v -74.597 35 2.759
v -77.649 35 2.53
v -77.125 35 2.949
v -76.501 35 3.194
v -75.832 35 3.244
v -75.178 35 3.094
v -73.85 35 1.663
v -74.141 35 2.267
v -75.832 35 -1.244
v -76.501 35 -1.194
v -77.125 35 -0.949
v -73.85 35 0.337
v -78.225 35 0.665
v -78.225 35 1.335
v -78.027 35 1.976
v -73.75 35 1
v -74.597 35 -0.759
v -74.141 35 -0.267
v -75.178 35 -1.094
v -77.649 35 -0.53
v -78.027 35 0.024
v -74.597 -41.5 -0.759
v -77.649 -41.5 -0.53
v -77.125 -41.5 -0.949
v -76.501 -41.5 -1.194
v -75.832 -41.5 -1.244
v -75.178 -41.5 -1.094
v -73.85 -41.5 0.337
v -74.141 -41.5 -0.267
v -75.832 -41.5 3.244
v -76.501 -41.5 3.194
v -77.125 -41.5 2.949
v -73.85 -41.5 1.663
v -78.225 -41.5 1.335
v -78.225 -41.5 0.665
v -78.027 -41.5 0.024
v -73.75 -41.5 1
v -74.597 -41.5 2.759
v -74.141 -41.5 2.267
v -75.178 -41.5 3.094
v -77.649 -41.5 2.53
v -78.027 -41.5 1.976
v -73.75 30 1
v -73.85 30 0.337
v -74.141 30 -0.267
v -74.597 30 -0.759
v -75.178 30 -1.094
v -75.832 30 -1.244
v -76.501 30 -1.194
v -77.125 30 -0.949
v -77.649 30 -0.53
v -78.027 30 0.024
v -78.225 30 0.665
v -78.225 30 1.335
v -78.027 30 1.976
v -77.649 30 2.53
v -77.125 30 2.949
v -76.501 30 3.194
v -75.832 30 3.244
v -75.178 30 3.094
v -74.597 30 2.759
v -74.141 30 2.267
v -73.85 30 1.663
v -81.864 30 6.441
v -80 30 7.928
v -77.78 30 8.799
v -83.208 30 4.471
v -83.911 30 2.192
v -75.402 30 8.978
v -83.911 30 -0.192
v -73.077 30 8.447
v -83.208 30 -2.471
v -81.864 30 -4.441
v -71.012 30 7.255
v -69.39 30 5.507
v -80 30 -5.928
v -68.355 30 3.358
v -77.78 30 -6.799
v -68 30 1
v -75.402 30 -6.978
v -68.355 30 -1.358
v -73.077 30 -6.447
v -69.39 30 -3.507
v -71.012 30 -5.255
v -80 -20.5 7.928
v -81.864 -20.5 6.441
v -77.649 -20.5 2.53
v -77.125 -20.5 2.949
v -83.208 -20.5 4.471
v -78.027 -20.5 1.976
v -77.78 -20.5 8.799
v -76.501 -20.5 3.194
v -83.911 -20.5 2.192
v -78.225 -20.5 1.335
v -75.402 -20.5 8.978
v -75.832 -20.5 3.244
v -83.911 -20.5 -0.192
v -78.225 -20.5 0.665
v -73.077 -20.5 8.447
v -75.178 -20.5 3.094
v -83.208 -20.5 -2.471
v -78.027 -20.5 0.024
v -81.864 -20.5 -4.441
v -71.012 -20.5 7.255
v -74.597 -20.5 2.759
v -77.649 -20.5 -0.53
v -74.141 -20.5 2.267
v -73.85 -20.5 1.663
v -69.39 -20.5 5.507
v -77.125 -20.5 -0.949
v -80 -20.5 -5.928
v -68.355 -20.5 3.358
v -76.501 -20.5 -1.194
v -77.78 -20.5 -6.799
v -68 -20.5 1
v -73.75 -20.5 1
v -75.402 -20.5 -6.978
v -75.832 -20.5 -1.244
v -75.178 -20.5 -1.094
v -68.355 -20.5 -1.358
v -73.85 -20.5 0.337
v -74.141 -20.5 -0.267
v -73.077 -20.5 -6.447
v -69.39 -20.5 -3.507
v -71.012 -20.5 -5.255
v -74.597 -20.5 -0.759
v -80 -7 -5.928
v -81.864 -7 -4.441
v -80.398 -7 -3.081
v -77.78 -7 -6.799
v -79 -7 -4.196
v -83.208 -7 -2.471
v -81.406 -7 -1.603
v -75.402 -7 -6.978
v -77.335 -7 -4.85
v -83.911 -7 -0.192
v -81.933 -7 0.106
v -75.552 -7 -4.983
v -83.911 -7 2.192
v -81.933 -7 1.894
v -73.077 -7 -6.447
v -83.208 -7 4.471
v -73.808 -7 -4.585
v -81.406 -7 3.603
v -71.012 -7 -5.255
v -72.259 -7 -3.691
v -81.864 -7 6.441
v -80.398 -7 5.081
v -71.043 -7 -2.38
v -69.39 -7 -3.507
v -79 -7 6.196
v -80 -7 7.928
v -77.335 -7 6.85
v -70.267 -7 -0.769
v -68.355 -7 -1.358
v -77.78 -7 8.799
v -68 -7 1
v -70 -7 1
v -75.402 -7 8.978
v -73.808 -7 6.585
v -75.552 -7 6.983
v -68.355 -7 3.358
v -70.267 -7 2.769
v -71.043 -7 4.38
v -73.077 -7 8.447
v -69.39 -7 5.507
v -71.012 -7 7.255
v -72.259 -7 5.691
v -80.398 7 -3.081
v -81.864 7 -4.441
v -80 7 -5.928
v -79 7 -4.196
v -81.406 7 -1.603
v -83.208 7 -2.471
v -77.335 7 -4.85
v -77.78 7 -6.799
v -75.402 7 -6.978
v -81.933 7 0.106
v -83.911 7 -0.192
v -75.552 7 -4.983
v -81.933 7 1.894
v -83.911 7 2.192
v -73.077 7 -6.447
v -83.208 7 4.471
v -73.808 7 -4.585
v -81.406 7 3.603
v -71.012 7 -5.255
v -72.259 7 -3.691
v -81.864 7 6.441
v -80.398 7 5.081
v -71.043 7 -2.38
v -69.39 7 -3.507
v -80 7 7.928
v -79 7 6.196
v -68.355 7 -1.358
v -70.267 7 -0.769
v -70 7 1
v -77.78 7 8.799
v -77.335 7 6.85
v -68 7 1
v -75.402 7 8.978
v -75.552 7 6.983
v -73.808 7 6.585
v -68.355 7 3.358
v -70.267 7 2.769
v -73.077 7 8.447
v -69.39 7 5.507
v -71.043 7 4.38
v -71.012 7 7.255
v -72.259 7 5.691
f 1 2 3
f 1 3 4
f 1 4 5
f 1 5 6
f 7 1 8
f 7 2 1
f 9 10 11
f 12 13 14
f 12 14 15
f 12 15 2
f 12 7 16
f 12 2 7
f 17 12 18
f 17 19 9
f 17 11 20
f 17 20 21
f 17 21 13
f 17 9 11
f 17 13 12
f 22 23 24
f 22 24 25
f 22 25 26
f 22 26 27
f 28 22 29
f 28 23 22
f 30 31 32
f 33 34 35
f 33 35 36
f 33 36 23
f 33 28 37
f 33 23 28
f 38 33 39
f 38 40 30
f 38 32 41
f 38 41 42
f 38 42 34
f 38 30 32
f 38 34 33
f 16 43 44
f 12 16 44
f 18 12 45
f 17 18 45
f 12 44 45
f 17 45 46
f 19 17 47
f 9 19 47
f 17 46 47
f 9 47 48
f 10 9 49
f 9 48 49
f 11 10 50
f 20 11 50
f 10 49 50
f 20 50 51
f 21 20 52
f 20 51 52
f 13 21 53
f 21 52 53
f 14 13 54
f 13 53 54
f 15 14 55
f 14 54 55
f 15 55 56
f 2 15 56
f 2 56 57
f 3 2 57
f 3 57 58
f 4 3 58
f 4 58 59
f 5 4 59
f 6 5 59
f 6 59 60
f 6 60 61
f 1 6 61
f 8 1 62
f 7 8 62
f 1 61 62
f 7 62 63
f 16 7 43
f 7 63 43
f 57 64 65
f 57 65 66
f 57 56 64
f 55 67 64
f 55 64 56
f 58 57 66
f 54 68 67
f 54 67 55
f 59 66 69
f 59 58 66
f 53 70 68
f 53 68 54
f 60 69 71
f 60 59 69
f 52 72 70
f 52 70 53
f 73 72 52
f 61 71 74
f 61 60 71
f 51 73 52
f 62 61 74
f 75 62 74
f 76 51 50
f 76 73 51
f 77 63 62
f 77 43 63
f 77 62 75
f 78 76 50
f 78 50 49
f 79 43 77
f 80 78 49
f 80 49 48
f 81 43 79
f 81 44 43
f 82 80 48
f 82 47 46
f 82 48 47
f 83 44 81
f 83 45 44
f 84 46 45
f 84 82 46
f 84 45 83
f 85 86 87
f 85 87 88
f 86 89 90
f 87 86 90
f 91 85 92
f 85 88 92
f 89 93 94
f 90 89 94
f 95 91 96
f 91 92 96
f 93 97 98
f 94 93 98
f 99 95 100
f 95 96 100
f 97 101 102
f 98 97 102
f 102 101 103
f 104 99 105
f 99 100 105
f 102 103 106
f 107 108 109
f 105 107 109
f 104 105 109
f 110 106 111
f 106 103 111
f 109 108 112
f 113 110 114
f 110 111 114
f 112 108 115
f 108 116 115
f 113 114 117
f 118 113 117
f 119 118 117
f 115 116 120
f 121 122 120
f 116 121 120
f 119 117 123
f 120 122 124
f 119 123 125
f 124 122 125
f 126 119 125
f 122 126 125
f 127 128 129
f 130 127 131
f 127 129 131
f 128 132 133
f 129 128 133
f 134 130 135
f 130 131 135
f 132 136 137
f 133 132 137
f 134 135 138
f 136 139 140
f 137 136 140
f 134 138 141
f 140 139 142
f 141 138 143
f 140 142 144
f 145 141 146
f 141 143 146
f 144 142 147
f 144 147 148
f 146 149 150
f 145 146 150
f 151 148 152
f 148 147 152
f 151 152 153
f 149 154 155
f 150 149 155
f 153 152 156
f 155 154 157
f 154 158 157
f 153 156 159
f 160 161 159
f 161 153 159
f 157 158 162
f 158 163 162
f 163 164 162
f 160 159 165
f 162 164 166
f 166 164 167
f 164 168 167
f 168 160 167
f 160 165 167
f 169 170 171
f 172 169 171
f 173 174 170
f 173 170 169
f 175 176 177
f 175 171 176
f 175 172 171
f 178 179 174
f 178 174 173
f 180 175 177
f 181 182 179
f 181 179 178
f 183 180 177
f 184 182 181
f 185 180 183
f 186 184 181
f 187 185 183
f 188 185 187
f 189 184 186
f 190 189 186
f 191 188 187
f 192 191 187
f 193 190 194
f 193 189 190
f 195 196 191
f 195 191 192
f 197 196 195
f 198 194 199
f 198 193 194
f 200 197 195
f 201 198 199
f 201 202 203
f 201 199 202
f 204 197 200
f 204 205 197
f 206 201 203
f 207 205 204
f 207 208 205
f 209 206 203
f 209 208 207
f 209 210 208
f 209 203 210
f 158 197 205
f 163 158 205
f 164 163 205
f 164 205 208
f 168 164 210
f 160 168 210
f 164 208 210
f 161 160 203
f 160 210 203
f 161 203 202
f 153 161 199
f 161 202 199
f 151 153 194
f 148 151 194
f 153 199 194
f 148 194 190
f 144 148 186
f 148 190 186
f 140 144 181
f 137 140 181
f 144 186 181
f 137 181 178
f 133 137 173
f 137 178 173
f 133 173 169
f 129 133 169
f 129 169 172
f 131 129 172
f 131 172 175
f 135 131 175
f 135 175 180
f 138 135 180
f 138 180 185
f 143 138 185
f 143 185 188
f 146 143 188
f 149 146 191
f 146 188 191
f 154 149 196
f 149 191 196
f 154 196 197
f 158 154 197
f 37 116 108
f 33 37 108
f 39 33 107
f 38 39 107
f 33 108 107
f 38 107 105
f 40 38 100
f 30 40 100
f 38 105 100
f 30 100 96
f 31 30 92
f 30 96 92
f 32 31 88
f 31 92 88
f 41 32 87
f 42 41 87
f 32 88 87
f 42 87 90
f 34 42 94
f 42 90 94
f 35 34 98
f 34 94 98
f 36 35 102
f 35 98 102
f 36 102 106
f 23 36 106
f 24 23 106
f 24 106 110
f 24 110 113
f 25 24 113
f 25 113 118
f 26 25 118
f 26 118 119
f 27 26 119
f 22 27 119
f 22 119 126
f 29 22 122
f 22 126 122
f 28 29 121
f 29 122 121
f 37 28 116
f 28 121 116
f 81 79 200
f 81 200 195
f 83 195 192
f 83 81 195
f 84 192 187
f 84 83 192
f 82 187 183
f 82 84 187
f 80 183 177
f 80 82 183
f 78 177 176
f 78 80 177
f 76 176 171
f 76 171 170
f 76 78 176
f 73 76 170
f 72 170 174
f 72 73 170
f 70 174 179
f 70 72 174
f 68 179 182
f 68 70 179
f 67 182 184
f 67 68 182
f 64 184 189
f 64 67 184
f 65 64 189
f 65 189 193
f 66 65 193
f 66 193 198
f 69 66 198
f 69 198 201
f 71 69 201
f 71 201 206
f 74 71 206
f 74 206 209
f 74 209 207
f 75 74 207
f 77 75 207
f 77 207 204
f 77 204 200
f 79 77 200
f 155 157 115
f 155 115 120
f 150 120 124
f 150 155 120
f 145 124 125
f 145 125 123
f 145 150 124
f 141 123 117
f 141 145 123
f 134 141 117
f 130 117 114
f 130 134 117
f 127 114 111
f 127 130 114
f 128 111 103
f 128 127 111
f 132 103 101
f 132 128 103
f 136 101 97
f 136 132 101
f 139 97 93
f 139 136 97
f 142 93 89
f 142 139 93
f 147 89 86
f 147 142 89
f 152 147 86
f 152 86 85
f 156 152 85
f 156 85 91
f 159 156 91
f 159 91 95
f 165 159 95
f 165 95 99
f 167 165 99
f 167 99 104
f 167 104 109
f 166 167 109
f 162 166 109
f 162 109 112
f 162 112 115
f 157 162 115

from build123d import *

# Parameters (mm, degrees)
TUBE001_R               = 10
TUBE001_R_2             = 6
TUBE001_DEPTH           = 14
SKETCH083_R             = 8
PAD059_DEPTH            = 50.5
SKETCH277_R             = 2.25
PAD114_DEPTH            = 5
SKETCH284_R             = 2.25
PAD119_DEPTH            = 21
BODY035_PLACEMENT_ANGLE = 180


with BuildPart() as tube001:
    # Tube001 → Tube001 (new body)
    with BuildSketch(Plane(origin=(-76, 7, 1), x_dir=(1, 0, 0), z_dir=(0, -1, 0))):
        Circle(TUBE001_R)
        Circle(TUBE001_R_2, mode=Mode.SUBTRACT)
    extrude(amount=TUBE001_DEPTH)


with BuildPart() as cut:
    # Sketch083 → Pad059 (new body)
    with BuildSketch(Plane.XZ):
        Circle(SKETCH083_R)
    extrude(amount=-PAD059_DEPTH)

    # Sketch277 (on Face2 of Pad059) → Pad114 (join)
    with BuildSketch(Plane.XZ):
        Circle(SKETCH277_R)
    extrude(amount=PAD114_DEPTH)

    # Sketch284 (on Face3 of Pad114) → Pad119 (join)
    with BuildSketch(Plane(origin=(0, 50.5, 0), x_dir=(1, 0, 0), z_dir=(0, 1, 0))):
        Circle(SKETCH284_R)
    extrude(amount=PAD119_DEPTH)


with BuildPart() as cut_1:
    # Body035 placement: moved
    add(cut.part.moved(Location((-76, 30, 1))).rotate(Axis((-76, 30, 1), (1, 0, 0)), BODY035_PLACEMENT_ANGLE))

    # Cut: cut Tube001
    add(tube001.part, mode=Mode.SUBTRACT)


solid = cut_1.part
